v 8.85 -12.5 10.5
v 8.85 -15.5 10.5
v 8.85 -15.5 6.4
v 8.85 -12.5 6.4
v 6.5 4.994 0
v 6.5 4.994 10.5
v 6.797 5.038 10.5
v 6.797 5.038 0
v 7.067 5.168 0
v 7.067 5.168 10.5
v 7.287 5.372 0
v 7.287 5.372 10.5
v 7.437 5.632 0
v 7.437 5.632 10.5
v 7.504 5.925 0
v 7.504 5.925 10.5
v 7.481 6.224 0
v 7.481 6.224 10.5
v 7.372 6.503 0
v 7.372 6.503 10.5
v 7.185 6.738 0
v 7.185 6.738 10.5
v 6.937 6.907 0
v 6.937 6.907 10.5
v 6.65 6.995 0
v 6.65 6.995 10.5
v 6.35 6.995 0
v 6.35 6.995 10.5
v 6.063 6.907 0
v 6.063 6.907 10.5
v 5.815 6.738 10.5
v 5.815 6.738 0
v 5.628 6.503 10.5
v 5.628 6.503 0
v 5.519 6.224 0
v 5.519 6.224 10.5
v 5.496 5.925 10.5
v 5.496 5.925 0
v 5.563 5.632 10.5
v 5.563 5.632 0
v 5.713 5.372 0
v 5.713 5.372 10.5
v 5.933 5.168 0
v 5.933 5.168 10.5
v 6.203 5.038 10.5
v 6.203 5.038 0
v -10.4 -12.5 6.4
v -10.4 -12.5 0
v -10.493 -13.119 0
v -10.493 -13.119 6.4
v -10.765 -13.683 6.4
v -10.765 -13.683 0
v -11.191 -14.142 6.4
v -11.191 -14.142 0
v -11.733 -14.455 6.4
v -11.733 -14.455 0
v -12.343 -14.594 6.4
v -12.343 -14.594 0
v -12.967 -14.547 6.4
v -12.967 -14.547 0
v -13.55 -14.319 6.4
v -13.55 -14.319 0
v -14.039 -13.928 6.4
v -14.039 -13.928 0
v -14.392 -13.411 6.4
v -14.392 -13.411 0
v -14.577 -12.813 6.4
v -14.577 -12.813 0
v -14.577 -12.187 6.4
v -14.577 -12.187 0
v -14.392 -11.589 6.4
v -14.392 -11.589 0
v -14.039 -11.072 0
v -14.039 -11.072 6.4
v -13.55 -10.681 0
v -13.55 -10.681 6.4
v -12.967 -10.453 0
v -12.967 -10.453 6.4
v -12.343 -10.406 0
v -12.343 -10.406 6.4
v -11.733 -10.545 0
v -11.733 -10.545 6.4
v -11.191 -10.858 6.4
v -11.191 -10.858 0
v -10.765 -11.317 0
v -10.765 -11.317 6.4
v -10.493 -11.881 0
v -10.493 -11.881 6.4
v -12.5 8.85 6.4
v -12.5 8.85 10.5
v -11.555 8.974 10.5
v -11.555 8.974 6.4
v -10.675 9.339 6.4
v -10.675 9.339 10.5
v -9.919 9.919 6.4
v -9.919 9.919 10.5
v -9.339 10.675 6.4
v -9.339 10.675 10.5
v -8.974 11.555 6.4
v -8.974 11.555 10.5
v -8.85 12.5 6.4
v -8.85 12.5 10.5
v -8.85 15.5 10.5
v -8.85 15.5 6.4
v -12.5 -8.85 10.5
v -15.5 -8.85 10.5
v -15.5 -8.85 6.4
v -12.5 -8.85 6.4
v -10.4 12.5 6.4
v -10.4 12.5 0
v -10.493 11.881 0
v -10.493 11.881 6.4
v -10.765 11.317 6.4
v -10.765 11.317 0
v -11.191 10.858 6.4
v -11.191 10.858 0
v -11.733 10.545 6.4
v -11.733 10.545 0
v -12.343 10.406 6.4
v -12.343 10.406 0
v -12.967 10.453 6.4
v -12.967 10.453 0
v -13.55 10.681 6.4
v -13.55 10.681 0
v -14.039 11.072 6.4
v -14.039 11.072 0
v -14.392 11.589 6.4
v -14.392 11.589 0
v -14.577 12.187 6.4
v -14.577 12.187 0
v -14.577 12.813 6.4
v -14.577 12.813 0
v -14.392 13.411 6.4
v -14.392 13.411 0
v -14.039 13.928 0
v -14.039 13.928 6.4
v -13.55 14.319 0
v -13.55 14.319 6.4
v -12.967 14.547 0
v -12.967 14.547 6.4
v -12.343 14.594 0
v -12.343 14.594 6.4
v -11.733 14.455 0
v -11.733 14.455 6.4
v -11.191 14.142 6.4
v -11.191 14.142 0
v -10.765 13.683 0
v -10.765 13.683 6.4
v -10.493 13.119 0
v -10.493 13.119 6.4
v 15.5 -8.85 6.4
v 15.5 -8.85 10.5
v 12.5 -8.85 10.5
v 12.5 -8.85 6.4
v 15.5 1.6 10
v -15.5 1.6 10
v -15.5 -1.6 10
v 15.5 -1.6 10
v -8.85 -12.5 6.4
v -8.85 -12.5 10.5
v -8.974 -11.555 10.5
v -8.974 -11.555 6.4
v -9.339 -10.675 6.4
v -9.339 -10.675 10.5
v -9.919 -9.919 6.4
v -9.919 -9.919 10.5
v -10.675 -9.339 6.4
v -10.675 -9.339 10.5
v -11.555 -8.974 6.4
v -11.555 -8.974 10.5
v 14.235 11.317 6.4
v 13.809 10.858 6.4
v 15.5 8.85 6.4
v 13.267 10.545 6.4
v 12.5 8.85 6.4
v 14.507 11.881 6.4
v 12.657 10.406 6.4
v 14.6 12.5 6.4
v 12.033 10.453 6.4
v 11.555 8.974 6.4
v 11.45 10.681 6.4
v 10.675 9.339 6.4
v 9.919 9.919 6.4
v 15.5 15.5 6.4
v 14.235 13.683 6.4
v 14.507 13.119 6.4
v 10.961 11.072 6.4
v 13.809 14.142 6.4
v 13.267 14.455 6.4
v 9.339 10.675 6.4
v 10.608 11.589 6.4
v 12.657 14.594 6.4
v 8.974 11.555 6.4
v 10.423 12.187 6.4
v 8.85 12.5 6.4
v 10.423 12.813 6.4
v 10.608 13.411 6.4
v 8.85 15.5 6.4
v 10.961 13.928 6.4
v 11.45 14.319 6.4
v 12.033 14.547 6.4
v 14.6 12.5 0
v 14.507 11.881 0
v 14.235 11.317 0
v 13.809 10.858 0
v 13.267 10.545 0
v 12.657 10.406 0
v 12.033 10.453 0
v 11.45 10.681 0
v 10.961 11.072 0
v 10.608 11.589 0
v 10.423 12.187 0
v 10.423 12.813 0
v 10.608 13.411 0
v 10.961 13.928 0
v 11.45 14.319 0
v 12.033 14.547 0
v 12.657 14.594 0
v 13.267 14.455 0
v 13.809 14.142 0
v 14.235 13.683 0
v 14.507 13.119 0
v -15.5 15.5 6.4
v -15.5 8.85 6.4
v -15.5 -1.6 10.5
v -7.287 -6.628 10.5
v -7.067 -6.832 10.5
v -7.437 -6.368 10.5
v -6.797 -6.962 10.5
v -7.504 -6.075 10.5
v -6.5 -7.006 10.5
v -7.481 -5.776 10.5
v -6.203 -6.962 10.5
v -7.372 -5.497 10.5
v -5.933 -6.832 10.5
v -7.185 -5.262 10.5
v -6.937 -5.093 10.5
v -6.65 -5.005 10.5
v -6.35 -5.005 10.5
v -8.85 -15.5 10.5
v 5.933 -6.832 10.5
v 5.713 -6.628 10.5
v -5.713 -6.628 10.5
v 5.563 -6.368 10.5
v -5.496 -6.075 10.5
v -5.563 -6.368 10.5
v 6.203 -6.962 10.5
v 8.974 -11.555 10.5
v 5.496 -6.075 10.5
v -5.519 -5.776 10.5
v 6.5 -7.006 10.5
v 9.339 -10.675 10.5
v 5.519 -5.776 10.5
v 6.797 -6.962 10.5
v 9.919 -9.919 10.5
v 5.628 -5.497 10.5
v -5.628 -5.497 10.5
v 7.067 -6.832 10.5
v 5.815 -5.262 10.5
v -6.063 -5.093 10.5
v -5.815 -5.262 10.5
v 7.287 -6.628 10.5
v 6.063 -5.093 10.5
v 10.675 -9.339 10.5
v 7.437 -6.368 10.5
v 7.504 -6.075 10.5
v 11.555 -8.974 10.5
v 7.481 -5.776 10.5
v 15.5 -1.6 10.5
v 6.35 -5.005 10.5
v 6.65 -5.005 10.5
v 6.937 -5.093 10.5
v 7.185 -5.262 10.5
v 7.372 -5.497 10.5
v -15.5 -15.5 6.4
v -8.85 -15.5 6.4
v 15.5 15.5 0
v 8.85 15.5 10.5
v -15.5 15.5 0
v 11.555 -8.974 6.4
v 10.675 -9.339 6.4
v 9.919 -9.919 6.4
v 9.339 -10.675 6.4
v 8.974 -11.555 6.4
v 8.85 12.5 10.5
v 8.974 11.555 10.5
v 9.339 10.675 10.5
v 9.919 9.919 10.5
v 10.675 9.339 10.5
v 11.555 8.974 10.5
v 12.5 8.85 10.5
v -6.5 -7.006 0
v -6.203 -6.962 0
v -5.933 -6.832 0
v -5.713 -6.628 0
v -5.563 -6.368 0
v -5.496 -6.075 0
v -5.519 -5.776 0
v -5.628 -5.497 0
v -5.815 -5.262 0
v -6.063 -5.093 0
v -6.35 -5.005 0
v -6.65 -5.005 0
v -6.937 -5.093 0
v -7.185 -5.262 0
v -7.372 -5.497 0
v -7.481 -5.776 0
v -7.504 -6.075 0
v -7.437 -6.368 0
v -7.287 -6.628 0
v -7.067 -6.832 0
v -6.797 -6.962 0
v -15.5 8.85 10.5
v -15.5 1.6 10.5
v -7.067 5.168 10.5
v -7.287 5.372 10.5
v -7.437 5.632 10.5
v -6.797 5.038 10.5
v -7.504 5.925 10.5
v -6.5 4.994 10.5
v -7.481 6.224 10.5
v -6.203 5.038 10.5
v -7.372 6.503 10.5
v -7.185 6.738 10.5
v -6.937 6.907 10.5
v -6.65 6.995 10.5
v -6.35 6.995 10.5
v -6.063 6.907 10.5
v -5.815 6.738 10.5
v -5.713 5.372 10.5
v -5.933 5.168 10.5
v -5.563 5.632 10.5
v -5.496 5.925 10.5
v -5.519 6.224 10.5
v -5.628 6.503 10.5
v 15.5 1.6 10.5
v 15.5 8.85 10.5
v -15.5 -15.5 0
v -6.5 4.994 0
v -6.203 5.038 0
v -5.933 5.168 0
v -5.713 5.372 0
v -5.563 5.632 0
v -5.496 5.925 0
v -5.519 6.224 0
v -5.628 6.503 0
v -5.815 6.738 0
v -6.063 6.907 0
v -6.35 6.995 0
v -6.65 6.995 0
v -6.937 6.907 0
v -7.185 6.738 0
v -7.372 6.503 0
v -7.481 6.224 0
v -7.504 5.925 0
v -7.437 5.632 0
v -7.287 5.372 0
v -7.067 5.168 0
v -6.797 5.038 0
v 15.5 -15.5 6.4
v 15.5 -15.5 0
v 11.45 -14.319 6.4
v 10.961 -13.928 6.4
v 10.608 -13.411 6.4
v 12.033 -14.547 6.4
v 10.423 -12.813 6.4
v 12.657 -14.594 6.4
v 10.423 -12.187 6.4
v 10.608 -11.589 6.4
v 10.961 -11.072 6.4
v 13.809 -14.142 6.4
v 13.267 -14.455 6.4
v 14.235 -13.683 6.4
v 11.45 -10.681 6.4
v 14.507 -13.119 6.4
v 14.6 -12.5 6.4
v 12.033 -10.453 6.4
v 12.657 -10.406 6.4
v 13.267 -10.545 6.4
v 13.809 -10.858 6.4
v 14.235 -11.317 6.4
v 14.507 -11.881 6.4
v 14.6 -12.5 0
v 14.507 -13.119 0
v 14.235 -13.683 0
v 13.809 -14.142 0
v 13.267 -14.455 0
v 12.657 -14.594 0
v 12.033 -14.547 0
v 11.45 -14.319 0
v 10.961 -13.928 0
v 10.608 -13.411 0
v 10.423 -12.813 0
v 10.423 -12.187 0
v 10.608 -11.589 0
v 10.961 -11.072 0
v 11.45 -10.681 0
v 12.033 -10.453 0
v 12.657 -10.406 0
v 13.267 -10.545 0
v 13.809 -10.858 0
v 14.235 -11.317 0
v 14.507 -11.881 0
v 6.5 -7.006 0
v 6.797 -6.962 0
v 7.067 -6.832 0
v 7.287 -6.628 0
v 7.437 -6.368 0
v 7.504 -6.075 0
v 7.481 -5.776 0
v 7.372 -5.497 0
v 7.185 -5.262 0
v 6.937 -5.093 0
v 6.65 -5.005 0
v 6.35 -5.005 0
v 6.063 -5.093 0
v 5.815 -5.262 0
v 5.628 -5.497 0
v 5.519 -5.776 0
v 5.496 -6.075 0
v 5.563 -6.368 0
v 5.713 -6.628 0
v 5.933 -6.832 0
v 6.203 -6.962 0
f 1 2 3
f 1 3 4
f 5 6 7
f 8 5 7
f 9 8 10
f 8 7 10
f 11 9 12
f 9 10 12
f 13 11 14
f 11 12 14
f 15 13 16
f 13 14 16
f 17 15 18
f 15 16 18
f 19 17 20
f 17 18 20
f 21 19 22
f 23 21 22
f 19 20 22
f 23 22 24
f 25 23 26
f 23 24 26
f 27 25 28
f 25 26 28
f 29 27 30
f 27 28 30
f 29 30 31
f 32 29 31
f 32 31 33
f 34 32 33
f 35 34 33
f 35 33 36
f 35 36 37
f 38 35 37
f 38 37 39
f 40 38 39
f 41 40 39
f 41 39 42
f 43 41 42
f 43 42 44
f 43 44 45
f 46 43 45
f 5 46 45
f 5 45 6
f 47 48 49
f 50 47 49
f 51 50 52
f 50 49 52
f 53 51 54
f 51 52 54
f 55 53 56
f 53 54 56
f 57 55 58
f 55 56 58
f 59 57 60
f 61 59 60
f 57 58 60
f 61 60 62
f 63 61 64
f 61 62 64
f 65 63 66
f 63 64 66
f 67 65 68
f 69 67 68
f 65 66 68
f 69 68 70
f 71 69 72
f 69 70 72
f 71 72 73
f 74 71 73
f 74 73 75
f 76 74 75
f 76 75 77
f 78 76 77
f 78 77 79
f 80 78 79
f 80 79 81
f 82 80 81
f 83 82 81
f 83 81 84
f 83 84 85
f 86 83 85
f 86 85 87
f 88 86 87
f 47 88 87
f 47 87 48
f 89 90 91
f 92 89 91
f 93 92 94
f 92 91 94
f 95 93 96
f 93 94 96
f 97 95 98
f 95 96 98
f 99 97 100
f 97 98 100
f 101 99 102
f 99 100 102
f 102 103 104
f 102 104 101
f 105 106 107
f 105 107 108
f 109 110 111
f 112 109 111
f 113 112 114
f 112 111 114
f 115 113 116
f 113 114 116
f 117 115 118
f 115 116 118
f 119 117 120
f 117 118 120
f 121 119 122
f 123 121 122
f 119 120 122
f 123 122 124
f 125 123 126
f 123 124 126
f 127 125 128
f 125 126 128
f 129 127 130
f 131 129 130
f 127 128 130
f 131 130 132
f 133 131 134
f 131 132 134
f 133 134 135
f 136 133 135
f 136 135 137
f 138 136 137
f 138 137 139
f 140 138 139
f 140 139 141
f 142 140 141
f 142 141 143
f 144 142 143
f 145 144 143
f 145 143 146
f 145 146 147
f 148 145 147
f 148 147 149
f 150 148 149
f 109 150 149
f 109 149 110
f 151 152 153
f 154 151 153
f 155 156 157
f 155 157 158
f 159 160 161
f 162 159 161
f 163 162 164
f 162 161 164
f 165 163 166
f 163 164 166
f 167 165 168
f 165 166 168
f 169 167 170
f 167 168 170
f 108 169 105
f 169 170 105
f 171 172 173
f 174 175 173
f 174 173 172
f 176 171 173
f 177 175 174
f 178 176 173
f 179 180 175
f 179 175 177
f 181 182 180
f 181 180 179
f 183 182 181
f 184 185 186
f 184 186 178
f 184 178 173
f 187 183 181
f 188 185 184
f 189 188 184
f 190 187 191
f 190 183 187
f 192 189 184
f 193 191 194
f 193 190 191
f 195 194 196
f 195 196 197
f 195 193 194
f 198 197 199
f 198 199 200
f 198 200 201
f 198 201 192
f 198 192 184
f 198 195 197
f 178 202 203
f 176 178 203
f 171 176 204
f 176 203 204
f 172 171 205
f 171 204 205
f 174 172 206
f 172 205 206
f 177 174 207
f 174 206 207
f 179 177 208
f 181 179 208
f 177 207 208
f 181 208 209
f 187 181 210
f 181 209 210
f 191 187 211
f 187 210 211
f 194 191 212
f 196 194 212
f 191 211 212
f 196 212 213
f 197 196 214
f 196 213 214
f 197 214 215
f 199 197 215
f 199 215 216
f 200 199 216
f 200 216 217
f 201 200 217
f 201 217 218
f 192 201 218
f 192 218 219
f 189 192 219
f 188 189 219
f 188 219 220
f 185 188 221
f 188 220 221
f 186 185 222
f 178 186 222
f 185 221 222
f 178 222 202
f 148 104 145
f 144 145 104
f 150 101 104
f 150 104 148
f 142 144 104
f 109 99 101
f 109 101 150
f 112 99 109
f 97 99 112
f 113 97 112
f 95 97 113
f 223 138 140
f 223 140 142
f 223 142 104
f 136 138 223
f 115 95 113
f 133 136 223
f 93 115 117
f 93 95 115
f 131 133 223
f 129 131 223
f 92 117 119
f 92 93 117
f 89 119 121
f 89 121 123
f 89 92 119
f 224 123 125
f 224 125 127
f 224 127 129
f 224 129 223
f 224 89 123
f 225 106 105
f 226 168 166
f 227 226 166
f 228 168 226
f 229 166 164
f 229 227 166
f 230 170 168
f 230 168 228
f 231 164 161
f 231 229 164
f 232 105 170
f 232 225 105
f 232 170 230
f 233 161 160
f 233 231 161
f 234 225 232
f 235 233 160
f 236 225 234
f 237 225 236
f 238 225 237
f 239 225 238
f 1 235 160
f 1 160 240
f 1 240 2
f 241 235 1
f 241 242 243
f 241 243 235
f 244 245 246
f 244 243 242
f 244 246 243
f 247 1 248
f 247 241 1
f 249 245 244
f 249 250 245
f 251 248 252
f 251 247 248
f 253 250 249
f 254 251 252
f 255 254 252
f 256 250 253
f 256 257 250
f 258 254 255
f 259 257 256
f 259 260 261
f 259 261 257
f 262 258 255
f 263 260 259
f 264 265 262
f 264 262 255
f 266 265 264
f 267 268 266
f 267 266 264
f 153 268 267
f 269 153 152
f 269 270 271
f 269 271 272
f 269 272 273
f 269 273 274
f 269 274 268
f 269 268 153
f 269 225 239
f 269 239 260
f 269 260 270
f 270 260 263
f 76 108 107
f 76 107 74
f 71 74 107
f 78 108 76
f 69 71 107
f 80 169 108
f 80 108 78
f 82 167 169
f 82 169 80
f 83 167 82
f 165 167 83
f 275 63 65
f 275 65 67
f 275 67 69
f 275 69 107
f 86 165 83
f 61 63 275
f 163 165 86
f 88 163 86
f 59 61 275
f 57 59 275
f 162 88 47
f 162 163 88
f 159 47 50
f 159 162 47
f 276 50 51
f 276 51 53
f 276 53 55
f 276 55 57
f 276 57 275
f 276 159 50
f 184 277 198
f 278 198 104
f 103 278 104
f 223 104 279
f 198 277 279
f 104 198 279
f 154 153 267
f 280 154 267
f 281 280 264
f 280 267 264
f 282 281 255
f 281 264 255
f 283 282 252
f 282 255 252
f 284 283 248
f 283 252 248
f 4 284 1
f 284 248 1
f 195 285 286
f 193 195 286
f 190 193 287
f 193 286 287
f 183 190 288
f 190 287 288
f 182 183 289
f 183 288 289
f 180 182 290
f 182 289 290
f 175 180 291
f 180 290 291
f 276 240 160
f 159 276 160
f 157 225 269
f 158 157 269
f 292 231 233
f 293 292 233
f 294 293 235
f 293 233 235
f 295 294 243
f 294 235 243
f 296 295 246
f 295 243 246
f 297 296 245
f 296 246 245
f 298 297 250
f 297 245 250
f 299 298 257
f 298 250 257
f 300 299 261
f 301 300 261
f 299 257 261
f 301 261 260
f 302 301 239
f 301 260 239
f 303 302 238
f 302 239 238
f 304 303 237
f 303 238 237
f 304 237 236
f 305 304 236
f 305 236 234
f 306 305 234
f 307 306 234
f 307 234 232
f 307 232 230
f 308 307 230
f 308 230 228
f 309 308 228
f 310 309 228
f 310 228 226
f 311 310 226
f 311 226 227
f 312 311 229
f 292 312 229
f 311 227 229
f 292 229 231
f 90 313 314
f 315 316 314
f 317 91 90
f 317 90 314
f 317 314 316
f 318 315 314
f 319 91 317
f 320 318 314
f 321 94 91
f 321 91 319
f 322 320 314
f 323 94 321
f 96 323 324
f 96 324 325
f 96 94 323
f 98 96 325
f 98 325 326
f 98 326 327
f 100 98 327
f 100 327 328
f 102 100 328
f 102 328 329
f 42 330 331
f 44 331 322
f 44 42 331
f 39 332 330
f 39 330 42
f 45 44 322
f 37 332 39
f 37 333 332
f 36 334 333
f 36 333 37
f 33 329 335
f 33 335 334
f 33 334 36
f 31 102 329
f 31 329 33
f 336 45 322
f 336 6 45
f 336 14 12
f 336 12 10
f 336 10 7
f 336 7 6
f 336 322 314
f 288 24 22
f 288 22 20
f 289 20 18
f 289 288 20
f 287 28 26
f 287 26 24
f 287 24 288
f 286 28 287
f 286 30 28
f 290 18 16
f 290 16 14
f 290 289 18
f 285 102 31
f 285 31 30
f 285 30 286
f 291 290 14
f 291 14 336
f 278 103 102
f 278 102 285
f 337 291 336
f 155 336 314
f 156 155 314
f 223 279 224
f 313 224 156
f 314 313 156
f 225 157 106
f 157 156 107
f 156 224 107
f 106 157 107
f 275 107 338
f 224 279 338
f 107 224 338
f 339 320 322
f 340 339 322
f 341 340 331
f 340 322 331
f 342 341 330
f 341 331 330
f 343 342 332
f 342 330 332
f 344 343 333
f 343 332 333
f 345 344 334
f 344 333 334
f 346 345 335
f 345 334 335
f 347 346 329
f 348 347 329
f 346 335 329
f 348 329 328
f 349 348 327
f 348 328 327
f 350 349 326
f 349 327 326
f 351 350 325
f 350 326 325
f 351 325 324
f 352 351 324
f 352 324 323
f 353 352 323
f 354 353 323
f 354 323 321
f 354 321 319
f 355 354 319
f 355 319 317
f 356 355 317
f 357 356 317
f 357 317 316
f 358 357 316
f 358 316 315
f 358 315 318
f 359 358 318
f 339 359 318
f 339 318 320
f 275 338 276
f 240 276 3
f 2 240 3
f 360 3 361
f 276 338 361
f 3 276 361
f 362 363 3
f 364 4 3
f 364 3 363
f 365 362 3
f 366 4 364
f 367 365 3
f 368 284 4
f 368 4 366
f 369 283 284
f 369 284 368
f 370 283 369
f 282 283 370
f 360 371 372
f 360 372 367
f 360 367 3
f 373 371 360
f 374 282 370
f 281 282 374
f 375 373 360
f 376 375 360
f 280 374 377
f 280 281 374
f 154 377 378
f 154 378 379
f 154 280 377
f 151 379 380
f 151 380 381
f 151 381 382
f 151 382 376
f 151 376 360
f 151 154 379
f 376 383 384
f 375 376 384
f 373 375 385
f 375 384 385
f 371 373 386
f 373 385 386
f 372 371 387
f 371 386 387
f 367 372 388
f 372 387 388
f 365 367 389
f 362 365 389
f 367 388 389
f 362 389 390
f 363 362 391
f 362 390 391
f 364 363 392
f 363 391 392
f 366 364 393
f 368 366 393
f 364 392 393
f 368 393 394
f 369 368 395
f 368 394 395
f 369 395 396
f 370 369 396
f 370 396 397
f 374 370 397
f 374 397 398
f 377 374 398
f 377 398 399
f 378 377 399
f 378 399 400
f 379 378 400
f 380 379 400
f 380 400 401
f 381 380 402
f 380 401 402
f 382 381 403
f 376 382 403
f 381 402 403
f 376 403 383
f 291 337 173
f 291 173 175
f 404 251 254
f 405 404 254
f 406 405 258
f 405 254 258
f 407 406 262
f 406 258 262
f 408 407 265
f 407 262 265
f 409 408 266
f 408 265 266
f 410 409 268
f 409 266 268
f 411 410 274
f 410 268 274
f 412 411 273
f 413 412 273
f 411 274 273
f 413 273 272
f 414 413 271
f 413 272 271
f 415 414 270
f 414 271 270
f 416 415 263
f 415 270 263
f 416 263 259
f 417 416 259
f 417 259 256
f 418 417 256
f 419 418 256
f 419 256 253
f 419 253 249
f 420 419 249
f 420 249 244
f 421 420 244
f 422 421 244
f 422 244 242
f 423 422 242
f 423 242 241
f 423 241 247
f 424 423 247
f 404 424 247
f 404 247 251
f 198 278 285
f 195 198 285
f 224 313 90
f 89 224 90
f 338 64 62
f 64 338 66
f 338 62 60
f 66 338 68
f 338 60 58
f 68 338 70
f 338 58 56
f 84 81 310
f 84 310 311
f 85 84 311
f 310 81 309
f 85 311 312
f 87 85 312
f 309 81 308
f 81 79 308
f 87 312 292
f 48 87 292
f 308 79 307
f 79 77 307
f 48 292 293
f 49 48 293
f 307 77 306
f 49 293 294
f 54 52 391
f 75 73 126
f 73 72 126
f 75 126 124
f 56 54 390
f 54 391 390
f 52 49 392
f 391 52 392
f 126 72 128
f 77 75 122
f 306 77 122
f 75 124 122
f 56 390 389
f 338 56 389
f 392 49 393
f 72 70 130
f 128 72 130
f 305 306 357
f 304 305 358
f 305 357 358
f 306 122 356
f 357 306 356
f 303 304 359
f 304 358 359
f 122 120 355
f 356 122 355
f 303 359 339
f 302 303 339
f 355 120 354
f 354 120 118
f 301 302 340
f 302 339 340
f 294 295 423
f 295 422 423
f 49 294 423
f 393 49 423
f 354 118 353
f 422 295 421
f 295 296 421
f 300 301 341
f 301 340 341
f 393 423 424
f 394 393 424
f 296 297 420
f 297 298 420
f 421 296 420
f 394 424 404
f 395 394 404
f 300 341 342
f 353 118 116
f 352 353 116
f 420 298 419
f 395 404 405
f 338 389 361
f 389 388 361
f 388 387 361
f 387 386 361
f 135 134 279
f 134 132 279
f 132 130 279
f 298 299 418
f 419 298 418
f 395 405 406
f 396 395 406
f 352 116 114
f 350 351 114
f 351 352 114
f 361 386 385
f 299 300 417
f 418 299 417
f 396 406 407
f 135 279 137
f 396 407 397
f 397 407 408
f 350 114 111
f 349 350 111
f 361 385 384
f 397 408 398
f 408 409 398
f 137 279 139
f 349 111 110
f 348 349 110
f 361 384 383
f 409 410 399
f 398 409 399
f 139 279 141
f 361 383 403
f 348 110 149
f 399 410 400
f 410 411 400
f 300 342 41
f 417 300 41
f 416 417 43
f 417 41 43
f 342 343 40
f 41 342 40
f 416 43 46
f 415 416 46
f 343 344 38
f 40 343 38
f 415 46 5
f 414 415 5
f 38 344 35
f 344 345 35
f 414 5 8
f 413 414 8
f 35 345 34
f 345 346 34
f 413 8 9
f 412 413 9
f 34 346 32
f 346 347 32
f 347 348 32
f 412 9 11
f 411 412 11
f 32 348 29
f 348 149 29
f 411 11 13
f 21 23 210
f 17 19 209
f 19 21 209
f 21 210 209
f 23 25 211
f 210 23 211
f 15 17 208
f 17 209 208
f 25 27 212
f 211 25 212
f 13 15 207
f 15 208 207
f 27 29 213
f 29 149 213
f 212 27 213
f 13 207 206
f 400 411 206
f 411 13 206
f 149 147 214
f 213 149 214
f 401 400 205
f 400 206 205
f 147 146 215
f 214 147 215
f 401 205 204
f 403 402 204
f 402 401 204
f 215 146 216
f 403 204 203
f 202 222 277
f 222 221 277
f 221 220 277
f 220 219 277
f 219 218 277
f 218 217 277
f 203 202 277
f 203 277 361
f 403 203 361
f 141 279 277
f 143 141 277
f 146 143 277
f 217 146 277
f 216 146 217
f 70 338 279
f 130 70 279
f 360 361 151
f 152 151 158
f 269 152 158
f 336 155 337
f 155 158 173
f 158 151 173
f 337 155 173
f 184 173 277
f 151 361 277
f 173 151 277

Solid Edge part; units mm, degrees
sketch "Sketch1" plane through (0, 0, 0) normal (0, 0, 1) x (1, 0, 0)
  line L0 (-15.5, -15.5) -> (15.5, -15.5)
  line L1 (15.5, -15.5) -> (15.5, 15.5)
  line L2 (15.5, 15.5) -> (-15.5, 15.5)
  line L3 (-15.5, 15.5) -> (-15.5, -15.5)
  circle A0 centre (-12.5, -12.5) radius 2.1
  circle A1 centre (-12.5, 12.5) radius 2.1
  circle A2 centre (12.5, 12.5) radius 2.1
  circle A3 centre (12.5, -12.5) radius 2.1
  dimension "D1" = 25
  dimension "D2" = 25
  dimension "D3" = 12.5
  dimension "D4" = 12.5
  dimension "D5" = 31
  dimension "D6" = 31
extrude "Protrusion1" add sketch "Sketch1" along normal blind 10.5
hole "Hole_1" at (-6.5, -6, 10.5) direction (0, 0, -1) diameter 2.013 end up to next
hole "Hole1" at (-6.5, 6, 10.5) direction (0, 0, -1) diameter 2.013 end up to next
hole "Hole2" at (6.5, 6, 10.5) direction (0, 0, -1) diameter 2.013 end up to next
hole "Hole3" at (6.5, -6, 10.5) direction (0, 0, -1) diameter 2.013 end up to next
sketch "Sketch2" plane through (0, 0, 10.5) normal (0, 0, 1) x (0, 1, 0)
  line L0 (-1.6, -15.5) -> (1.6, -15.5)
  line L1 (1.6, -15.5) -> (1.6, 15.5)
  line L2 (1.6, 15.5) -> (-1.6, 15.5)
  line L3 (-1.6, 15.5) -> (-1.6, -15.5)
  dimension "D1" = 3.2
extrude "ExtrudedCutout_1" cut sketch "Sketch2" against normal blind 0.5
sketch "Sketch3" plane through (0, -8.575, 10.5) normal (0, 0, 1) x (0, 1, 0)
  line L0 (-6.925, -8.85) -> (-3.925, -8.85)
  arc A0 (-3.925, -8.85) -> (-0.275, -12.5) centre (-3.925, -12.5) cw
  line L1 (-0.275, -15.5) -> (-0.275, -12.5)
  dimension "D1" = 3.65
  dimension "D2" = 3.65
  dimension "D3" = 3
  dimension "D4" = 3
  dimension "D5" = 3.65
extrude "ExtrudedCutout_2" cut sketch "Sketch3" against normal blind 4.1 material side at (8.9, -14, 10.5)
pattern_circular "Pattern2" count 4 over 360 about axis through (0, 0, 10.5) along (0, 0, -1) of "ExtrudedCutout_2"
